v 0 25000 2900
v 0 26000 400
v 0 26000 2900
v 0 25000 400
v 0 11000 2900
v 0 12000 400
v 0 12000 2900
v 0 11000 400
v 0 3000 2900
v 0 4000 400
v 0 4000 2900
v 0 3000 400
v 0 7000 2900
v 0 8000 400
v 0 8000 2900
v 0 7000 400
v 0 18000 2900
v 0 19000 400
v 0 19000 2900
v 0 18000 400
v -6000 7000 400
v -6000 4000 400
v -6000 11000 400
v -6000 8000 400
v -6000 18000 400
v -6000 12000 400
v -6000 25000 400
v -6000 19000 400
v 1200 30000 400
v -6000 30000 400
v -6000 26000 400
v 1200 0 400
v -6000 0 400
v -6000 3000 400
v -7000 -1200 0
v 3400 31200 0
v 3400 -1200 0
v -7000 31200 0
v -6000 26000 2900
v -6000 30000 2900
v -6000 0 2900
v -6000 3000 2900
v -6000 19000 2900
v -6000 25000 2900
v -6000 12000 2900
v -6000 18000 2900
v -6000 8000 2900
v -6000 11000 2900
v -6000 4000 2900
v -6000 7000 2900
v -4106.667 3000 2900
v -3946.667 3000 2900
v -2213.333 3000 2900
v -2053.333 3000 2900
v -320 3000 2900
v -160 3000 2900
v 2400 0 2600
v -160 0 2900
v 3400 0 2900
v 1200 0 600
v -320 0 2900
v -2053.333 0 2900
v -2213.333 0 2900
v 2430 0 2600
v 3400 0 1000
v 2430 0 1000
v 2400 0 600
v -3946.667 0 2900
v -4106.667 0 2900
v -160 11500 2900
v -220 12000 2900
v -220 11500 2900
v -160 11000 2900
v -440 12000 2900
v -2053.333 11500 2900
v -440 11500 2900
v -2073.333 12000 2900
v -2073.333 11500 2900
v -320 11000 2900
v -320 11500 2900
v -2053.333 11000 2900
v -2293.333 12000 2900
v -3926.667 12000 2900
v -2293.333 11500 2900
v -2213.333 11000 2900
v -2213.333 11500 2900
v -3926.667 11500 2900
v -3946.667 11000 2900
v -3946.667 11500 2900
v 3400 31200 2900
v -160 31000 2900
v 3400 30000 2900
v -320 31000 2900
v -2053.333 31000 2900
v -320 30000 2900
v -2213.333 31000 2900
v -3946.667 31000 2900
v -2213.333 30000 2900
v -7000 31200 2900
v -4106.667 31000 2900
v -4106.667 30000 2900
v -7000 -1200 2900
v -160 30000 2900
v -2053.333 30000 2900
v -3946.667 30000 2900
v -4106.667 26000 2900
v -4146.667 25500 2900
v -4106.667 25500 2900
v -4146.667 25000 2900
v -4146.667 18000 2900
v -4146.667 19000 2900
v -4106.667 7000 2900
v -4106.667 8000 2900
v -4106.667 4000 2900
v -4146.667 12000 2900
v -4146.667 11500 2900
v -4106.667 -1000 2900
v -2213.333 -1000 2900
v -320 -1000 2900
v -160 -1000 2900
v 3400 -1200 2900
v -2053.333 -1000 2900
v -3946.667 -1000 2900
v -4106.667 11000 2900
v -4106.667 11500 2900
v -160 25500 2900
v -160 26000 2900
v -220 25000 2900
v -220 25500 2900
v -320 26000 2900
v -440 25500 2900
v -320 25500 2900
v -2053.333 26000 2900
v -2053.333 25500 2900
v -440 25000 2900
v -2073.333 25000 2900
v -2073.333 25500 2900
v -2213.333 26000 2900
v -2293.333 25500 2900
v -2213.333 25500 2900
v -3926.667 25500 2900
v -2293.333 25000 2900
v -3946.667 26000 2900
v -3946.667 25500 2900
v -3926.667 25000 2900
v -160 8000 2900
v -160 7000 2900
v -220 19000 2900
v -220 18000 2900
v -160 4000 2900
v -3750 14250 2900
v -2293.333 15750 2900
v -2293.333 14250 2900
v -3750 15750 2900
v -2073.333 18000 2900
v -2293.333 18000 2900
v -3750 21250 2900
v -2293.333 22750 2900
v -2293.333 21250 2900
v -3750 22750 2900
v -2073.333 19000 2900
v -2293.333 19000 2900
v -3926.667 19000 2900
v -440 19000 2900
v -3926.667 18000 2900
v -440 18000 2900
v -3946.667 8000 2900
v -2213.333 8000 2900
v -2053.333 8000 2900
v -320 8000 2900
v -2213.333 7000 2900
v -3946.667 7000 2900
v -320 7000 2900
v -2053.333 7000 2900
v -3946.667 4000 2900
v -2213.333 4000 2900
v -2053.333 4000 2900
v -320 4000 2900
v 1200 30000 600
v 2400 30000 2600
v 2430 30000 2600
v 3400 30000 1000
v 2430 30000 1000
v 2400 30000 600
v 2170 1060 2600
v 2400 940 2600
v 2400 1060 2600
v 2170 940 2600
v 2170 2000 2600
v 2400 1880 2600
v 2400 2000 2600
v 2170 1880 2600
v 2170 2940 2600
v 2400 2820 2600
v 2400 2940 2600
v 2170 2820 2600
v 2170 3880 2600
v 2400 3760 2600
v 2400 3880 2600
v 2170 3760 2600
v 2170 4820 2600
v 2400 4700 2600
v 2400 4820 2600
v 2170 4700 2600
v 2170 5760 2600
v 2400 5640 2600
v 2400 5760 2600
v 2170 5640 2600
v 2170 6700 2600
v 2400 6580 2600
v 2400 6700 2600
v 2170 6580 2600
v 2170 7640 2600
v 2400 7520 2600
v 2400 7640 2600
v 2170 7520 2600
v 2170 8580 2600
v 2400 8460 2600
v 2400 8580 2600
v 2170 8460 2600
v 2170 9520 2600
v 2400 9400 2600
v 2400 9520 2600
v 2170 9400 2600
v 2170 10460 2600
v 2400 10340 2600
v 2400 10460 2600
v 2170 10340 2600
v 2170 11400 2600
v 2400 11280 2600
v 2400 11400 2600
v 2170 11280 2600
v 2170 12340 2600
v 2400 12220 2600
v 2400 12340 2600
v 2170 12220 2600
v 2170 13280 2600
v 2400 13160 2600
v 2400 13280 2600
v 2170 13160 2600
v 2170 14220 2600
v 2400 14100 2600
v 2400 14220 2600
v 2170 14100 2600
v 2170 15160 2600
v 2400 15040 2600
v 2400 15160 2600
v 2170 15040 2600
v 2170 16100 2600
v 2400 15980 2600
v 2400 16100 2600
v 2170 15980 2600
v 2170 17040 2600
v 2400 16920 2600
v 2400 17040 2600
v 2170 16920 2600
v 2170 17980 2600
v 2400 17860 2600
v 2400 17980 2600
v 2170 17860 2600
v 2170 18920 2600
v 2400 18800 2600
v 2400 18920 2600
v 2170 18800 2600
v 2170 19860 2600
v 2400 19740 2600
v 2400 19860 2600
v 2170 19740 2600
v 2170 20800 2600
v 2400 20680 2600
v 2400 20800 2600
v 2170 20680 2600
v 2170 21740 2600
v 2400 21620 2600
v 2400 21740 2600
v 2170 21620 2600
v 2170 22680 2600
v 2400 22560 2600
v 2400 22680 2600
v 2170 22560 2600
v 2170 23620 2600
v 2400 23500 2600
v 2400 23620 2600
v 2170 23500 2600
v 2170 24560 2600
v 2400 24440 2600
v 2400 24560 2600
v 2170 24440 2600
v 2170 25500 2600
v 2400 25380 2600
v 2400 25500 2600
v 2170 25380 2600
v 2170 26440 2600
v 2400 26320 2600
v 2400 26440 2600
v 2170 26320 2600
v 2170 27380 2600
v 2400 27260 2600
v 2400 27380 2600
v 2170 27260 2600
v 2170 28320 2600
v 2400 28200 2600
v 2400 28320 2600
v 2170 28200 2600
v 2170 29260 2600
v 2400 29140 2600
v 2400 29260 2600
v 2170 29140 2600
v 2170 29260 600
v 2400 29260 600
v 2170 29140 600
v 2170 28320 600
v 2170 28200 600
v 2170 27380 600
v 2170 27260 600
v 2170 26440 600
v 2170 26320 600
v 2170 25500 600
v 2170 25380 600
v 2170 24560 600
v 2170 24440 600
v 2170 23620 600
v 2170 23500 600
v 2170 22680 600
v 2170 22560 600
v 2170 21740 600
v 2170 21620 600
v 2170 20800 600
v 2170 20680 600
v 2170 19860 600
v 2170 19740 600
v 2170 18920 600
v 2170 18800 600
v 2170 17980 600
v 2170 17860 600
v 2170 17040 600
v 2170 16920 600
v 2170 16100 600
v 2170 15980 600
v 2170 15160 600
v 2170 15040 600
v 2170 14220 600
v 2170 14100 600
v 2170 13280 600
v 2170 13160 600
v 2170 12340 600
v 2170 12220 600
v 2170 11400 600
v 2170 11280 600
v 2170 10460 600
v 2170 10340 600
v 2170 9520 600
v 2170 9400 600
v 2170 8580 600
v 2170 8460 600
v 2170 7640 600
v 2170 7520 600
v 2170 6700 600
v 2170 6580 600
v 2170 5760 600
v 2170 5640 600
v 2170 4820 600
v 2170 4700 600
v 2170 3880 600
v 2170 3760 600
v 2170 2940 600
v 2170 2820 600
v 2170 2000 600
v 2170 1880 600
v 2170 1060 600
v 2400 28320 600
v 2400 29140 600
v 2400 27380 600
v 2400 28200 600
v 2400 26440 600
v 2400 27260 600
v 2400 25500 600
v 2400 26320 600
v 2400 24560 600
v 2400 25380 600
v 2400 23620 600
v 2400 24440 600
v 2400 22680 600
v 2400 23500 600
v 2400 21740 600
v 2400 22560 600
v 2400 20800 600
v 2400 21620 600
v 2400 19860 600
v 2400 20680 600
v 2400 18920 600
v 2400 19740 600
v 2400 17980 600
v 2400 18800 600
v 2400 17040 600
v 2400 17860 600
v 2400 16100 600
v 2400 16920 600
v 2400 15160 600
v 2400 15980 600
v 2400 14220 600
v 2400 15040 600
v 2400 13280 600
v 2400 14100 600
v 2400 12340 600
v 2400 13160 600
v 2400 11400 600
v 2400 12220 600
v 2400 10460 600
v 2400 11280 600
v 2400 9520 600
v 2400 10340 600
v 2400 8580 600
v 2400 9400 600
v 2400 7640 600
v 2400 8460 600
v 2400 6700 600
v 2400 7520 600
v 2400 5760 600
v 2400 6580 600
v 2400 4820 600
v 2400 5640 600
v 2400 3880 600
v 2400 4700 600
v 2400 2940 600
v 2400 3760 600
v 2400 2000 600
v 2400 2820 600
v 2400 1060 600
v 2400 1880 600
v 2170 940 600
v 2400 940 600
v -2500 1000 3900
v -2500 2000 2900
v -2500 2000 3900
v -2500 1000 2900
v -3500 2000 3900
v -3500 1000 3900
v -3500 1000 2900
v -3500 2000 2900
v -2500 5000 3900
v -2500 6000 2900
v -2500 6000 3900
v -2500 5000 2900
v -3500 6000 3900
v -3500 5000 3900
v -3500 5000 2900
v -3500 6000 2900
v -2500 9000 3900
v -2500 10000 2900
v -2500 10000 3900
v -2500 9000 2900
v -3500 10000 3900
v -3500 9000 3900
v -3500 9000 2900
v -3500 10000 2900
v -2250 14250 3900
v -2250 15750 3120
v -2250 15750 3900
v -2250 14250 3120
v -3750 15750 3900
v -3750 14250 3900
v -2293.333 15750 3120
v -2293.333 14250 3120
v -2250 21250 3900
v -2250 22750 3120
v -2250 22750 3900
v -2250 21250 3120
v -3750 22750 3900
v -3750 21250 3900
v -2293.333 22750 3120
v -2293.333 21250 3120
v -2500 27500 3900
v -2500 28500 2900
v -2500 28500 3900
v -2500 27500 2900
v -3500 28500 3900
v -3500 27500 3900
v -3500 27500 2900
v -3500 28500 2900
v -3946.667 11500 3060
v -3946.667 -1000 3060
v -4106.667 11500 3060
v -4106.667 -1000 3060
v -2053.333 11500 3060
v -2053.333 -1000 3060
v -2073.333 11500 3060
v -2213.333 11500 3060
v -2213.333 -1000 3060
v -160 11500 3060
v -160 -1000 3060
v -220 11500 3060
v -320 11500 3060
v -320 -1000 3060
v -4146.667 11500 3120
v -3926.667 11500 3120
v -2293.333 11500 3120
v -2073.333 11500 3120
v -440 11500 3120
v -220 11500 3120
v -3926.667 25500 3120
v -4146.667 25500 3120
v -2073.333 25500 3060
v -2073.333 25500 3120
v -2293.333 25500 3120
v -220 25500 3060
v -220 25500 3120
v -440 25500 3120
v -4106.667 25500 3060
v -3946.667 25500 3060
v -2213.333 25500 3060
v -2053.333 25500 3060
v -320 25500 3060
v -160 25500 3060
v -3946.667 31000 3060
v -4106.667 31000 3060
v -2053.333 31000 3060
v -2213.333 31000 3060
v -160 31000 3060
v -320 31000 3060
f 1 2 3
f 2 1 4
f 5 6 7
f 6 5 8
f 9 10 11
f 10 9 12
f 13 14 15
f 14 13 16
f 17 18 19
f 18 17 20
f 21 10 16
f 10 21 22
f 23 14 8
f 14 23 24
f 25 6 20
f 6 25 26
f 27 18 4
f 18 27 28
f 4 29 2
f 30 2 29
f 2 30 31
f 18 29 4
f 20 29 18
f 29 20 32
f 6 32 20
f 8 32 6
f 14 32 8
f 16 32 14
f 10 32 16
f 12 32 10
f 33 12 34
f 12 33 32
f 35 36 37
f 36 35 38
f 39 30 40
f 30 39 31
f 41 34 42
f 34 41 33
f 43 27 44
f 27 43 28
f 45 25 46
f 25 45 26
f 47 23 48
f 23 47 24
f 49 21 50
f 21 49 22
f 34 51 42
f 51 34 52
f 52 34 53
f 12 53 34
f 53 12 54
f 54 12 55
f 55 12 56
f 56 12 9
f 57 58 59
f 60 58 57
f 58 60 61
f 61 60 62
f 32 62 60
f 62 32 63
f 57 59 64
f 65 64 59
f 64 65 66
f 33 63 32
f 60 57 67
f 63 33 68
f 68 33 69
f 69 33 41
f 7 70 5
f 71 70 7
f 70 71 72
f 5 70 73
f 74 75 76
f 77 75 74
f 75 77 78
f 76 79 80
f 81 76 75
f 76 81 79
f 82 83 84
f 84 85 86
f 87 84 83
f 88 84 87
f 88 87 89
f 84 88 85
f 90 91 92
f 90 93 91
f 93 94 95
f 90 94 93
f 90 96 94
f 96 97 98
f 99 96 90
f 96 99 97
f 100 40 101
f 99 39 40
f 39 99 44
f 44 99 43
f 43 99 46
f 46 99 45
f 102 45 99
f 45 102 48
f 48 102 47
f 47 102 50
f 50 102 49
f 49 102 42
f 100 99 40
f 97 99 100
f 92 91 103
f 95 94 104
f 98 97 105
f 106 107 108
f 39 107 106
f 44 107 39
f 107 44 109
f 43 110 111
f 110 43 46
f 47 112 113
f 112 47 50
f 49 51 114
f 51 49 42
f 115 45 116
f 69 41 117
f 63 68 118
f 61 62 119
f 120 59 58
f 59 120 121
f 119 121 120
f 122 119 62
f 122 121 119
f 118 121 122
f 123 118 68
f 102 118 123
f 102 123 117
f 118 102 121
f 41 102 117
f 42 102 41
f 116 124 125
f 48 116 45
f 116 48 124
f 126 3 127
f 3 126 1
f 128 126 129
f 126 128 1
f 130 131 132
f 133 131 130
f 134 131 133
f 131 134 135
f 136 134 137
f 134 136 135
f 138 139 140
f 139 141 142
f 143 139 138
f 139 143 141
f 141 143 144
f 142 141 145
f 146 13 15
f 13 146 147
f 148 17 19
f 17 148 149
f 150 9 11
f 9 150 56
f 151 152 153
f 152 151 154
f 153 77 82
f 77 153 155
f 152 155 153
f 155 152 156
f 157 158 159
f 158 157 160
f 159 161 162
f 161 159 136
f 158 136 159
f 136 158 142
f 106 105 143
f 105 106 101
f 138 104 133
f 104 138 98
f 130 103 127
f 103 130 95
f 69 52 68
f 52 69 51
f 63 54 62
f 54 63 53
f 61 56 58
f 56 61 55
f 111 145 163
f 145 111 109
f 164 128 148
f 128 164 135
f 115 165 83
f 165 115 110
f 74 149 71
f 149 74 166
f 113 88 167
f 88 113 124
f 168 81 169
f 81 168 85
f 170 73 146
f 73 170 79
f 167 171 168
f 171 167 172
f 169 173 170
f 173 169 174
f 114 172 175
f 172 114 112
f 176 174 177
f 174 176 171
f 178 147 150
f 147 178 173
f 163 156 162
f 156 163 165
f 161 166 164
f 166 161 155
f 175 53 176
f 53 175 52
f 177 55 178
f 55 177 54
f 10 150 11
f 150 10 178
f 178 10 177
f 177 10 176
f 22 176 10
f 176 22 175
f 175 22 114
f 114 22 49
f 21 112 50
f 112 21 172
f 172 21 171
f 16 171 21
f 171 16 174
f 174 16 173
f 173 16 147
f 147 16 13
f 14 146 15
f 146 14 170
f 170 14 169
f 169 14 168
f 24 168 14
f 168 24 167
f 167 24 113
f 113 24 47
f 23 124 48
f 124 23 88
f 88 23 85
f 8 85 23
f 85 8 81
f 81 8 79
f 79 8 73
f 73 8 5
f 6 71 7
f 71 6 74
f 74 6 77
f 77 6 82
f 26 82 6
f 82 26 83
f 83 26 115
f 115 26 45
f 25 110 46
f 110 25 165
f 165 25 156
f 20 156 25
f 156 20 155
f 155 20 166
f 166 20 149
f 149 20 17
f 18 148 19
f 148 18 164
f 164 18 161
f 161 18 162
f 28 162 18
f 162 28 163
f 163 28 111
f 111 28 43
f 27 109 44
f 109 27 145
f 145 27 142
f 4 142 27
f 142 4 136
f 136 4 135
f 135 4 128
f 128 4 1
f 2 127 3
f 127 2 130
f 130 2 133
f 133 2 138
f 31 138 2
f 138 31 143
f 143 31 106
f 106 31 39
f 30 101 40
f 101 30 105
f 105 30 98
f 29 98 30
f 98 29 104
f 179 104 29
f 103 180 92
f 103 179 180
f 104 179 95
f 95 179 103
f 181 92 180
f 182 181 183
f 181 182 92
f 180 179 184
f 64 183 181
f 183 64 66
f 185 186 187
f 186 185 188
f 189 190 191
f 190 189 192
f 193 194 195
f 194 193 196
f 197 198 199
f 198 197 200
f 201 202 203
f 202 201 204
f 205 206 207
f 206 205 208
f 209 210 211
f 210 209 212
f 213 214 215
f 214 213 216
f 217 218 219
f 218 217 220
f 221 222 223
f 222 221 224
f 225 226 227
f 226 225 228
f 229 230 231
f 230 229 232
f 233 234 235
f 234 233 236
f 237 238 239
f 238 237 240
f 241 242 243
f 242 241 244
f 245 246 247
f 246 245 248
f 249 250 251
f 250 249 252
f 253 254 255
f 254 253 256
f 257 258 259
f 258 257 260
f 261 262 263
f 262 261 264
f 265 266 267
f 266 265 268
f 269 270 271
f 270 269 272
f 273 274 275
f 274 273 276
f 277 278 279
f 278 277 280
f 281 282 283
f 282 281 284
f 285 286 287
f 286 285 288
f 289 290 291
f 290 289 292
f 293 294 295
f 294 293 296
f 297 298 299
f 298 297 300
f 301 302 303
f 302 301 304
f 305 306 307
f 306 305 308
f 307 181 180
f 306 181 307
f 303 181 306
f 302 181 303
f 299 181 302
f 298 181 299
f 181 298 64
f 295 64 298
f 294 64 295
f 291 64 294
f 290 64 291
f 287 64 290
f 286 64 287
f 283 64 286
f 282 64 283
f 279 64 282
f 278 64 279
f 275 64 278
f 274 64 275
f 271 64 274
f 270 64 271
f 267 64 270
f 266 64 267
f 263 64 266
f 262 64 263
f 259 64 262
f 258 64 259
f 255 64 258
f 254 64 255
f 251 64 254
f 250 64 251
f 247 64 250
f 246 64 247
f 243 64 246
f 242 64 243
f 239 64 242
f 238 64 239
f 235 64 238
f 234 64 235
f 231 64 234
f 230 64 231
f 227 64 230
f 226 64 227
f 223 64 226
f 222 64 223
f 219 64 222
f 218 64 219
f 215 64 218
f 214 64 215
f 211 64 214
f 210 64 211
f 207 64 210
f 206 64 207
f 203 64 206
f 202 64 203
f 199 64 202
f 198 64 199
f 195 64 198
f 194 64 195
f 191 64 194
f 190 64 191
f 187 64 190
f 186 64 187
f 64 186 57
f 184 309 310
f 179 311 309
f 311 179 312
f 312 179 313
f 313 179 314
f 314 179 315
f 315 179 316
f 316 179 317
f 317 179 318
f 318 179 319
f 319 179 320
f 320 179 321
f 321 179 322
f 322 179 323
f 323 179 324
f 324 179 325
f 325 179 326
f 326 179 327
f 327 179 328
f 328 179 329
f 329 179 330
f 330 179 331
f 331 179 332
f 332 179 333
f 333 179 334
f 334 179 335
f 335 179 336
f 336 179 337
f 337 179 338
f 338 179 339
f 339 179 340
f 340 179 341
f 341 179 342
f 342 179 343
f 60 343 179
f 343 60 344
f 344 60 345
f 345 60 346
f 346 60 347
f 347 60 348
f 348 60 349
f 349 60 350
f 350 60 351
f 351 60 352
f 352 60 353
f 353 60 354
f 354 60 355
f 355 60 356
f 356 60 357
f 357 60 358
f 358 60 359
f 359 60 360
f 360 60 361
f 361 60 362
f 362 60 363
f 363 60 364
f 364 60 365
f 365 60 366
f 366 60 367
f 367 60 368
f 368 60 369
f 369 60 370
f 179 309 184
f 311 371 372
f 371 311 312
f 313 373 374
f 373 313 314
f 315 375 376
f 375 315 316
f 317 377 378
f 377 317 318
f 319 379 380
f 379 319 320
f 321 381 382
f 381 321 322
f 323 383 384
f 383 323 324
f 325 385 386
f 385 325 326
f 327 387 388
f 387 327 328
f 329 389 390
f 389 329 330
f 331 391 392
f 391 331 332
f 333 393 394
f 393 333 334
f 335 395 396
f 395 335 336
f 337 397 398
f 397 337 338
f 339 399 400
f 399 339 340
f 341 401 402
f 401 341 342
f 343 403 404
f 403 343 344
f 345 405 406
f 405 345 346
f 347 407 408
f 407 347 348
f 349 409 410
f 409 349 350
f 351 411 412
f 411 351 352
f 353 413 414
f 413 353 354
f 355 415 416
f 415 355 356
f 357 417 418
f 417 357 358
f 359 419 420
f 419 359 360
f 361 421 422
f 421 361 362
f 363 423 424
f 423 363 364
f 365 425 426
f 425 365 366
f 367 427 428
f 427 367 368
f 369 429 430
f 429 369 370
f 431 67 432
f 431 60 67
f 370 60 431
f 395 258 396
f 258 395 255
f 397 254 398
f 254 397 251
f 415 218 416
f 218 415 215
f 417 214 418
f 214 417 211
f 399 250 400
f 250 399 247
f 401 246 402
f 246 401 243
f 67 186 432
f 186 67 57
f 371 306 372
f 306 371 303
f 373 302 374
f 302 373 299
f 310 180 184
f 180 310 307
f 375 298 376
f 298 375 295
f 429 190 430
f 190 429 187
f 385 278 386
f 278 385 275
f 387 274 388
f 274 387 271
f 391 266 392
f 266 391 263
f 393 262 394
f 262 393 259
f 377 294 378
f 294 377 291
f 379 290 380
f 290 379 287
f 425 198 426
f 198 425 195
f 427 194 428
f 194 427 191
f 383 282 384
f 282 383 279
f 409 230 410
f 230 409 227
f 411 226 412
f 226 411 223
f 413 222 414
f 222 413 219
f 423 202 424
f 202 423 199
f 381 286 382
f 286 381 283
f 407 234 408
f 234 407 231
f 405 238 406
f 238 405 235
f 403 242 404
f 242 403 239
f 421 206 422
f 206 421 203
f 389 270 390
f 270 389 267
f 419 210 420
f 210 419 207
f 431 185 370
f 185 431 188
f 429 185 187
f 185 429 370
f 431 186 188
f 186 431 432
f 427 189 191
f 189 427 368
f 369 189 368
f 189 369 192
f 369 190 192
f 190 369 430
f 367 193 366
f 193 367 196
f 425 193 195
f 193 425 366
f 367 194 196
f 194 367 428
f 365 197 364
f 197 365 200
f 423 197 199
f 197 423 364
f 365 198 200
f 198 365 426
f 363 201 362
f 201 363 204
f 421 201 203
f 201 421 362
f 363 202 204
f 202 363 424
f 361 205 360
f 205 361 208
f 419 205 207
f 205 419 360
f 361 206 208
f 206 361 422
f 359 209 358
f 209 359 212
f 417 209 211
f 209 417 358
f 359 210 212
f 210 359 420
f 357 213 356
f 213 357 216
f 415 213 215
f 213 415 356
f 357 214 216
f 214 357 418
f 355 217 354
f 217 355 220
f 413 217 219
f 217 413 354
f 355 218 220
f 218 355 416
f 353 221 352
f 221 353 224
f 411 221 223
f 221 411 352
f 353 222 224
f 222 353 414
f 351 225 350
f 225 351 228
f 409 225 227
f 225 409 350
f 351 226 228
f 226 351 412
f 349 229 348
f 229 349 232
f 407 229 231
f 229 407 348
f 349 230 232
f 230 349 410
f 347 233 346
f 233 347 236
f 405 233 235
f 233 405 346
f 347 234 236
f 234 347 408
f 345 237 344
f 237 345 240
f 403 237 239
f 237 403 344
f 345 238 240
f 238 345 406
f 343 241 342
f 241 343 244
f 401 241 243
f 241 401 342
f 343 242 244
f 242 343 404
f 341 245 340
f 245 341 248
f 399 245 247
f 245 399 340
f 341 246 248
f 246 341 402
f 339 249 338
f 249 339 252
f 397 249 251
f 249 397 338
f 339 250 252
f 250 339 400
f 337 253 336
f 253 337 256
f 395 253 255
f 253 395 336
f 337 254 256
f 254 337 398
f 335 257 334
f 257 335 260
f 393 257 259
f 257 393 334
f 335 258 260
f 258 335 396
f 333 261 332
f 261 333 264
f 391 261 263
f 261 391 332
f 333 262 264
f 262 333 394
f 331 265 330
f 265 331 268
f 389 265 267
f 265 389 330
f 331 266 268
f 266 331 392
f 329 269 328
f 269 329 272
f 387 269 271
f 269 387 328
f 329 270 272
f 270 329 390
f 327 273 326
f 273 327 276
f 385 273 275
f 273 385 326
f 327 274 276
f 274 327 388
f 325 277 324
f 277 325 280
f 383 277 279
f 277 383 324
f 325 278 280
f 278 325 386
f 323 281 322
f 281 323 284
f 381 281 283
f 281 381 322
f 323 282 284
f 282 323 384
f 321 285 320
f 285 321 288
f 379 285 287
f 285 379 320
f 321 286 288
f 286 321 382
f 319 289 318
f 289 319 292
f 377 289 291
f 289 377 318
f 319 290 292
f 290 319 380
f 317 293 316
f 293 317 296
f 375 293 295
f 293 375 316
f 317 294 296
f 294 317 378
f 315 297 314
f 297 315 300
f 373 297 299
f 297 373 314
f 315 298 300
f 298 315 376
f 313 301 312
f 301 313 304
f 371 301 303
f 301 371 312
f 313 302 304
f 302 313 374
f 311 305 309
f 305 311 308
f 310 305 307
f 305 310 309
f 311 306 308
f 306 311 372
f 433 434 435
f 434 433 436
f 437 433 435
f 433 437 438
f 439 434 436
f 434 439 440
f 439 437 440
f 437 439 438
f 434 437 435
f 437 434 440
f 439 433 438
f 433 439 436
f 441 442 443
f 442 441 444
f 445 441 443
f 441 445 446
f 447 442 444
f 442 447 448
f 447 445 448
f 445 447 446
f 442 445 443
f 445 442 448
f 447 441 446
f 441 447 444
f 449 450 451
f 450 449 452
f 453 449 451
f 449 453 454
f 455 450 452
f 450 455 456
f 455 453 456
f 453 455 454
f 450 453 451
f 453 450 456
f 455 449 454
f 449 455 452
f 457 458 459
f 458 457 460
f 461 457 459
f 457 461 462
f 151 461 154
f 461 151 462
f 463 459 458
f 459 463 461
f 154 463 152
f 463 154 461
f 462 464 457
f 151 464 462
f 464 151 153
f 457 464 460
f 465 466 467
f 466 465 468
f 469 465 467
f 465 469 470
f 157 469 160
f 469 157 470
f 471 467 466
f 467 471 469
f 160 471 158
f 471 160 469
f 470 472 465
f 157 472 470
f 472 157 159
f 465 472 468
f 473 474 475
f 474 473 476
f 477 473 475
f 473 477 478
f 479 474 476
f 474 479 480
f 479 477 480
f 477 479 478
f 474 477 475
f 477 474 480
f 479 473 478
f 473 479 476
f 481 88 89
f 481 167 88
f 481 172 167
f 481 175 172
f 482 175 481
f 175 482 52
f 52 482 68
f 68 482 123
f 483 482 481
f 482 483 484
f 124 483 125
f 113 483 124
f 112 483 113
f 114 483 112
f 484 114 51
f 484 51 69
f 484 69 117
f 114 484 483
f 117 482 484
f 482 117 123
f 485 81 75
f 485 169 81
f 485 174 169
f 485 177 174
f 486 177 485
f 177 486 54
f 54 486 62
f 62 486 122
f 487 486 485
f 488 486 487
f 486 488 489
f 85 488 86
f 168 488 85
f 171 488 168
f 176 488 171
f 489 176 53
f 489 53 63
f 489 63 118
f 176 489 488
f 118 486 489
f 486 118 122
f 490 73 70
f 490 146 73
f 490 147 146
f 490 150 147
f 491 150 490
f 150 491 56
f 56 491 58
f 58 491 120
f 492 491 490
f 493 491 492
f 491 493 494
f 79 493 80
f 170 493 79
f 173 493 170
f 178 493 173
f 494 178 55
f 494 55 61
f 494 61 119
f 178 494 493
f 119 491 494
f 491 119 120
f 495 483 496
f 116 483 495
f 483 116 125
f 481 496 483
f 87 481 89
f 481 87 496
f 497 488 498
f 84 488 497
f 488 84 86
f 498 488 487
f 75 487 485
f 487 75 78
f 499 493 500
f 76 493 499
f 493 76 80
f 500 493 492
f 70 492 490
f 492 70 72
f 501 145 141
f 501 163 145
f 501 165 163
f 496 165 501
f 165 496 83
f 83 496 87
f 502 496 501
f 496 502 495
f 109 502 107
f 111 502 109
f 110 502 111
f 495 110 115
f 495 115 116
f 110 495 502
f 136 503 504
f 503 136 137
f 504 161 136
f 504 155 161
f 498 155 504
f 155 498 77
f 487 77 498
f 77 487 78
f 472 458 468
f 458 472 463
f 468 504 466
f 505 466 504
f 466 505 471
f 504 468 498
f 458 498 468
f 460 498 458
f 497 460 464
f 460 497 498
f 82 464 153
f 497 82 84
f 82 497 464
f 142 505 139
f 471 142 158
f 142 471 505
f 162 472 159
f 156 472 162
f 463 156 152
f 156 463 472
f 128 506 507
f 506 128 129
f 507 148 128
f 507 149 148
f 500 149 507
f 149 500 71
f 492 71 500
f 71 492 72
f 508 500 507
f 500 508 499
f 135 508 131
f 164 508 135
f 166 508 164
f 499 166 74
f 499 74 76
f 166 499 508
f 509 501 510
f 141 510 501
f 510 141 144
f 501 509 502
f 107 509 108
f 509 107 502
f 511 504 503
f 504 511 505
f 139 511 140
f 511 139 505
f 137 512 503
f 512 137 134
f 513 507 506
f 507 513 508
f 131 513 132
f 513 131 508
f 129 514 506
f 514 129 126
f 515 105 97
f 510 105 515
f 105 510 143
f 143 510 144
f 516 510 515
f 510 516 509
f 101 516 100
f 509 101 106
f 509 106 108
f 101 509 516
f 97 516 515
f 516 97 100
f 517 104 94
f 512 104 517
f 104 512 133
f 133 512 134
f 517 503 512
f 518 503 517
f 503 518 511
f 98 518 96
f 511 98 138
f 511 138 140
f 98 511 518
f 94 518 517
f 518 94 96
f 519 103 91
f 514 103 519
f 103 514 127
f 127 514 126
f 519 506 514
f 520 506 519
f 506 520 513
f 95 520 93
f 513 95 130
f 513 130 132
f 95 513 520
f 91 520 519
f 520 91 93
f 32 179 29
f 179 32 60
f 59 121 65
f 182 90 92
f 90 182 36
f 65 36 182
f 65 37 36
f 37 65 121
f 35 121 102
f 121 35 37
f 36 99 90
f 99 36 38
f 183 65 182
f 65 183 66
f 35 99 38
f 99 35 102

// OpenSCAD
// Earthship Generator
// (c) 2022 Julien BOUCARON under MIT License

// Transform everything from meters to mm
scaleFactor = 1000.0;

// Length in meters of the corridor
length = 30.0;

// Window
windowAngle = 90.0; // Not used
windowHeight = 2.0;
windowWidth = 1.0;
windowDepth = 0.03;
windowColor = "LightBlue";
windowColorAlpha = 0.3;

// WindowChassis
windowChassisWidth = 0.120;
windowChassisHeight = 0.200;
windowChassisColor = "Brown";

// PlantZone between the window and the main corridor
plantZoneWidth = 1.2;
plantHeight = 0.6;
plantColor = "DarkGreen";

// Corridor
corridorWidth = 1.2;
corridorHeight = 0.4;
corridorColor = "MediumBlue";

// "Rooms"
roomColor = "Gold";
roomHeight = 0.4;
roomLength = 6.0;
// room wall internal width
roomWallInternalWidth = 1.0;
roomWallInternalHeight = 2.5 + roomHeight;
roomWallInternalColor = "Grey";
// List of rooms width
roomListWidth = [0.0, 3.0 , 
    3.0 + roomWallInternalWidth, 3.0,
    6.0 + 2 * roomWallInternalWidth, 3.0,
    9.0 + 3 * roomWallInternalWidth, 6.0,
    15.0 + 4 * roomWallInternalWidth, 6.0,
    21.0 + 5 * roomWallInternalWidth, 4.0];            
     

// LightWells for Rooms
lightWellColor = "LightBlue";
lightWellColorAlpha = 0.3;
lightWellColorHeight = 1.0;
lightWellList = [ 1.0 ,  1.0,
    1.0, 1.0,
    1.0, 1.0,   
    1.5, 1.5,
    1.5, 1.5,
    1.0, 1.0];
            
// External Walls
wallSideWidth = 1.2;
wallSideColor = "Red";
wallSideFrontOffset = 1.0;

frontWallWidth = 1.0;
frontWallHeight = 1.0;
frontWallColor = "Violet";

backWallWidth = 1.0;
backWallHeight = roomWallInternalHeight;
backWallColor = "Violet";


// Beams (assuming IPE) - assuming about 6 Ton load per beam (just a guess)
roomBeamColor = "Indigo";
roomBeamsList= [ 0.16, 0.16,
    0.16, 0.16,
    0.16, 0.16,
    0.22, 0.22,
    0.22, 0.22,
    0.16, 0.16
];
roomBeamsCountList = [ 3, 3,
    3, 3,
    3, 3,
    3, 3,
    3, 3,
    3, 3
];




// Generating corridor
color(corridorColor) cube([corridorWidth * scaleFactor, length * scaleFactor, corridorHeight * scaleFactor]);
// Generating plantZone
translate([corridorWidth * scaleFactor, 0, 0]) color(plantColor) cube([plantZoneWidth * scaleFactor, length * scaleFactor, plantHeight * scaleFactor]);
// Generating rooms
for( i = [0:2:len(roomListWidth) -1]) {
    // Debug
   echo("Index " ); echo(i);
   
    translate([ - roomLength * scaleFactor, roomListWidth[i] * scaleFactor,  0]) color(roomColor) cube([roomLength * scaleFactor,   roomListWidth[i+1] * scaleFactor, roomHeight * scaleFactor]);
    // Walls
    // Debug
     echo("Room Internal Wall Offset "); echo(roomListWidth[i+1] * scaleFactor);
    if ( i < len(roomListWidth) - 2 ) {
       translate([ - roomLength * scaleFactor, (roomListWidth[i] + roomListWidth[i+1]) * scaleFactor,  0]) color(roomWallInternalColor) cube([roomLength * scaleFactor,   roomWallInternalWidth * scaleFactor, roomWallInternalHeight * scaleFactor]);
    }
}
// Generate Side Walls
translate([ - roomLength * scaleFactor, - wallSideWidth * scaleFactor, 0]) color(wallSideColor) cube([( plantZoneWidth + corridorWidth + roomLength + wallSideFrontOffset) * scaleFactor, wallSideWidth * scaleFactor, roomWallInternalHeight * scaleFactor]);
translate([ - roomLength * scaleFactor, length  * scaleFactor, 0]) color(wallSideColor) cube([( plantZoneWidth + corridorWidth + roomLength + wallSideFrontOffset) * scaleFactor, wallSideWidth * scaleFactor, roomWallInternalHeight * scaleFactor]);
// Generate Front Wall
translate([(corridorWidth + plantZoneWidth  ) * scaleFactor, 0, 0]) color(frontWallColor) cube([ frontWallWidth* scaleFactor, length * scaleFactor , frontWallHeight * scaleFactor]);
// Generate Back Wall
translate([-(roomLength +backWallWidth ) * scaleFactor, - wallSideWidth * scaleFactor, 0]) color(backWallColor) cube([ backWallWidth* scaleFactor, ( length + 2.0 * wallSideWidth)  * scaleFactor , backWallHeight * scaleFactor]);
// Generate windows + chassis
for( i = [0:windowWidth:length]) {
    // Debug
    echo ("Index Window "); echo (i);
    translate([ (corridorWidth + plantZoneWidth) * scaleFactor, i * windowWidth * scaleFactor, plantHeight * scaleFactor]) color(windowColor, windowColorAlpha) cube([windowDepth * scaleFactor, windowWidth * scaleFactor,  windowHeight * scaleFactor]);
    translate([ (corridorWidth + plantZoneWidth - windowDepth - windowChassisHeight) * scaleFactor, ( i + 1) * (windowWidth - 0.5 * windowChassisWidth) * scaleFactor, plantHeight * scaleFactor]) color(windowChassisColor) cube([ (windowDepth + windowChassisHeight) * scaleFactor, windowChassisWidth * scaleFactor,  windowHeight * scaleFactor]);
}
// Generate Light Wells for Rooms
for( i = [0:2:len(lightWellList) -1]) {
    // Debug
   echo("Light Well Index " ); echo(i);
   
    translate([ (- roomLength/2 - lightWellList[i]/2 )  * scaleFactor,  (roomListWidth[i] + roomListWidth[i+1]/2 - lightWellList[i+1]/2 )  * scaleFactor,  roomWallInternalHeight * scaleFactor]) color(lightWellColor, lightWellColorAlpha) cube([lightWellList[i] * scaleFactor,   lightWellList[i+1] * scaleFactor, lightWellColorHeight * scaleFactor]);
    // Walls
}


// Generate Beams for Rooms
for( i = [0:2:len(roomBeamsList) -1]) {
    for( j = [0:1:roomBeamsCountList[i]-1]) {
        
        echo(str("Beams Distance to remove = ",(roomBeamsCountList[i]*roomBeamsList[i]) ));
        dist = (roomLength - ((roomBeamsCountList[i]-1)*roomBeamsList[i]))/roomBeamsCountList[i];
        
    // Debug
   echo("Room Beams List Index " ); echo(i);
        if ( i == len(roomBeamsList) -2) {
            translate([ (- roomLength + (j+1) * dist) * scaleFactor, (roomListWidth[i] - roomWallInternalWidth/2)* scaleFactor, roomWallInternalHeight * scaleFactor ]) color(roomBeamColor) cube([ roomBeamsList[i] * scaleFactor, (roomListWidth[i+1]  + roomWallInternalWidth * 1.5) * scaleFactor , roomBeamsList[i+1] * scaleFactor]);
        }
        else if ( i != 0 ) {
            translate([ (- roomLength + (j+1) * dist) * scaleFactor, (roomListWidth[i] - roomWallInternalWidth/2)* scaleFactor, roomWallInternalHeight * scaleFactor ]) color(roomBeamColor) cube([ roomBeamsList[i] * scaleFactor, (roomListWidth[i+1]  + roomWallInternalWidth ) * scaleFactor , roomBeamsList[i+1] * scaleFactor]);
        }       
        else {
             translate([ (- roomLength + (j+1) * dist) * scaleFactor, (roomListWidth[i] - roomWallInternalWidth)* scaleFactor, roomWallInternalHeight * scaleFactor ]) color(roomBeamColor) cube([ roomBeamsList[i] * scaleFactor, (roomListWidth[i+1]  + roomWallInternalWidth * 1.5 ) * scaleFactor , roomBeamsList[i+1] * scaleFactor]);
        }
    }
     
}

// Generate Window Beam // TODO


// Stats
countWindows = length/windowWidth;
echo (str("Windows count = ",countWindows));
rooms = len(roomListWidth)/2;
echo (str("Rooms = ", rooms));
roomSurface = 0;
for( i = [0:2:len(roomListWidth) -1]) {
    currentRoomSurface = roomListWidth[i+1] * roomLength;
    echo (str("Surface Room[",i/2,"] = ", currentRoomSurface  ," square meters"));   
}
echo (str("Plant Surface = ", plantZoneWidth * length)," square meters");
echo (str("Corridor surface = ", corridorWidth * length," square meters"));
